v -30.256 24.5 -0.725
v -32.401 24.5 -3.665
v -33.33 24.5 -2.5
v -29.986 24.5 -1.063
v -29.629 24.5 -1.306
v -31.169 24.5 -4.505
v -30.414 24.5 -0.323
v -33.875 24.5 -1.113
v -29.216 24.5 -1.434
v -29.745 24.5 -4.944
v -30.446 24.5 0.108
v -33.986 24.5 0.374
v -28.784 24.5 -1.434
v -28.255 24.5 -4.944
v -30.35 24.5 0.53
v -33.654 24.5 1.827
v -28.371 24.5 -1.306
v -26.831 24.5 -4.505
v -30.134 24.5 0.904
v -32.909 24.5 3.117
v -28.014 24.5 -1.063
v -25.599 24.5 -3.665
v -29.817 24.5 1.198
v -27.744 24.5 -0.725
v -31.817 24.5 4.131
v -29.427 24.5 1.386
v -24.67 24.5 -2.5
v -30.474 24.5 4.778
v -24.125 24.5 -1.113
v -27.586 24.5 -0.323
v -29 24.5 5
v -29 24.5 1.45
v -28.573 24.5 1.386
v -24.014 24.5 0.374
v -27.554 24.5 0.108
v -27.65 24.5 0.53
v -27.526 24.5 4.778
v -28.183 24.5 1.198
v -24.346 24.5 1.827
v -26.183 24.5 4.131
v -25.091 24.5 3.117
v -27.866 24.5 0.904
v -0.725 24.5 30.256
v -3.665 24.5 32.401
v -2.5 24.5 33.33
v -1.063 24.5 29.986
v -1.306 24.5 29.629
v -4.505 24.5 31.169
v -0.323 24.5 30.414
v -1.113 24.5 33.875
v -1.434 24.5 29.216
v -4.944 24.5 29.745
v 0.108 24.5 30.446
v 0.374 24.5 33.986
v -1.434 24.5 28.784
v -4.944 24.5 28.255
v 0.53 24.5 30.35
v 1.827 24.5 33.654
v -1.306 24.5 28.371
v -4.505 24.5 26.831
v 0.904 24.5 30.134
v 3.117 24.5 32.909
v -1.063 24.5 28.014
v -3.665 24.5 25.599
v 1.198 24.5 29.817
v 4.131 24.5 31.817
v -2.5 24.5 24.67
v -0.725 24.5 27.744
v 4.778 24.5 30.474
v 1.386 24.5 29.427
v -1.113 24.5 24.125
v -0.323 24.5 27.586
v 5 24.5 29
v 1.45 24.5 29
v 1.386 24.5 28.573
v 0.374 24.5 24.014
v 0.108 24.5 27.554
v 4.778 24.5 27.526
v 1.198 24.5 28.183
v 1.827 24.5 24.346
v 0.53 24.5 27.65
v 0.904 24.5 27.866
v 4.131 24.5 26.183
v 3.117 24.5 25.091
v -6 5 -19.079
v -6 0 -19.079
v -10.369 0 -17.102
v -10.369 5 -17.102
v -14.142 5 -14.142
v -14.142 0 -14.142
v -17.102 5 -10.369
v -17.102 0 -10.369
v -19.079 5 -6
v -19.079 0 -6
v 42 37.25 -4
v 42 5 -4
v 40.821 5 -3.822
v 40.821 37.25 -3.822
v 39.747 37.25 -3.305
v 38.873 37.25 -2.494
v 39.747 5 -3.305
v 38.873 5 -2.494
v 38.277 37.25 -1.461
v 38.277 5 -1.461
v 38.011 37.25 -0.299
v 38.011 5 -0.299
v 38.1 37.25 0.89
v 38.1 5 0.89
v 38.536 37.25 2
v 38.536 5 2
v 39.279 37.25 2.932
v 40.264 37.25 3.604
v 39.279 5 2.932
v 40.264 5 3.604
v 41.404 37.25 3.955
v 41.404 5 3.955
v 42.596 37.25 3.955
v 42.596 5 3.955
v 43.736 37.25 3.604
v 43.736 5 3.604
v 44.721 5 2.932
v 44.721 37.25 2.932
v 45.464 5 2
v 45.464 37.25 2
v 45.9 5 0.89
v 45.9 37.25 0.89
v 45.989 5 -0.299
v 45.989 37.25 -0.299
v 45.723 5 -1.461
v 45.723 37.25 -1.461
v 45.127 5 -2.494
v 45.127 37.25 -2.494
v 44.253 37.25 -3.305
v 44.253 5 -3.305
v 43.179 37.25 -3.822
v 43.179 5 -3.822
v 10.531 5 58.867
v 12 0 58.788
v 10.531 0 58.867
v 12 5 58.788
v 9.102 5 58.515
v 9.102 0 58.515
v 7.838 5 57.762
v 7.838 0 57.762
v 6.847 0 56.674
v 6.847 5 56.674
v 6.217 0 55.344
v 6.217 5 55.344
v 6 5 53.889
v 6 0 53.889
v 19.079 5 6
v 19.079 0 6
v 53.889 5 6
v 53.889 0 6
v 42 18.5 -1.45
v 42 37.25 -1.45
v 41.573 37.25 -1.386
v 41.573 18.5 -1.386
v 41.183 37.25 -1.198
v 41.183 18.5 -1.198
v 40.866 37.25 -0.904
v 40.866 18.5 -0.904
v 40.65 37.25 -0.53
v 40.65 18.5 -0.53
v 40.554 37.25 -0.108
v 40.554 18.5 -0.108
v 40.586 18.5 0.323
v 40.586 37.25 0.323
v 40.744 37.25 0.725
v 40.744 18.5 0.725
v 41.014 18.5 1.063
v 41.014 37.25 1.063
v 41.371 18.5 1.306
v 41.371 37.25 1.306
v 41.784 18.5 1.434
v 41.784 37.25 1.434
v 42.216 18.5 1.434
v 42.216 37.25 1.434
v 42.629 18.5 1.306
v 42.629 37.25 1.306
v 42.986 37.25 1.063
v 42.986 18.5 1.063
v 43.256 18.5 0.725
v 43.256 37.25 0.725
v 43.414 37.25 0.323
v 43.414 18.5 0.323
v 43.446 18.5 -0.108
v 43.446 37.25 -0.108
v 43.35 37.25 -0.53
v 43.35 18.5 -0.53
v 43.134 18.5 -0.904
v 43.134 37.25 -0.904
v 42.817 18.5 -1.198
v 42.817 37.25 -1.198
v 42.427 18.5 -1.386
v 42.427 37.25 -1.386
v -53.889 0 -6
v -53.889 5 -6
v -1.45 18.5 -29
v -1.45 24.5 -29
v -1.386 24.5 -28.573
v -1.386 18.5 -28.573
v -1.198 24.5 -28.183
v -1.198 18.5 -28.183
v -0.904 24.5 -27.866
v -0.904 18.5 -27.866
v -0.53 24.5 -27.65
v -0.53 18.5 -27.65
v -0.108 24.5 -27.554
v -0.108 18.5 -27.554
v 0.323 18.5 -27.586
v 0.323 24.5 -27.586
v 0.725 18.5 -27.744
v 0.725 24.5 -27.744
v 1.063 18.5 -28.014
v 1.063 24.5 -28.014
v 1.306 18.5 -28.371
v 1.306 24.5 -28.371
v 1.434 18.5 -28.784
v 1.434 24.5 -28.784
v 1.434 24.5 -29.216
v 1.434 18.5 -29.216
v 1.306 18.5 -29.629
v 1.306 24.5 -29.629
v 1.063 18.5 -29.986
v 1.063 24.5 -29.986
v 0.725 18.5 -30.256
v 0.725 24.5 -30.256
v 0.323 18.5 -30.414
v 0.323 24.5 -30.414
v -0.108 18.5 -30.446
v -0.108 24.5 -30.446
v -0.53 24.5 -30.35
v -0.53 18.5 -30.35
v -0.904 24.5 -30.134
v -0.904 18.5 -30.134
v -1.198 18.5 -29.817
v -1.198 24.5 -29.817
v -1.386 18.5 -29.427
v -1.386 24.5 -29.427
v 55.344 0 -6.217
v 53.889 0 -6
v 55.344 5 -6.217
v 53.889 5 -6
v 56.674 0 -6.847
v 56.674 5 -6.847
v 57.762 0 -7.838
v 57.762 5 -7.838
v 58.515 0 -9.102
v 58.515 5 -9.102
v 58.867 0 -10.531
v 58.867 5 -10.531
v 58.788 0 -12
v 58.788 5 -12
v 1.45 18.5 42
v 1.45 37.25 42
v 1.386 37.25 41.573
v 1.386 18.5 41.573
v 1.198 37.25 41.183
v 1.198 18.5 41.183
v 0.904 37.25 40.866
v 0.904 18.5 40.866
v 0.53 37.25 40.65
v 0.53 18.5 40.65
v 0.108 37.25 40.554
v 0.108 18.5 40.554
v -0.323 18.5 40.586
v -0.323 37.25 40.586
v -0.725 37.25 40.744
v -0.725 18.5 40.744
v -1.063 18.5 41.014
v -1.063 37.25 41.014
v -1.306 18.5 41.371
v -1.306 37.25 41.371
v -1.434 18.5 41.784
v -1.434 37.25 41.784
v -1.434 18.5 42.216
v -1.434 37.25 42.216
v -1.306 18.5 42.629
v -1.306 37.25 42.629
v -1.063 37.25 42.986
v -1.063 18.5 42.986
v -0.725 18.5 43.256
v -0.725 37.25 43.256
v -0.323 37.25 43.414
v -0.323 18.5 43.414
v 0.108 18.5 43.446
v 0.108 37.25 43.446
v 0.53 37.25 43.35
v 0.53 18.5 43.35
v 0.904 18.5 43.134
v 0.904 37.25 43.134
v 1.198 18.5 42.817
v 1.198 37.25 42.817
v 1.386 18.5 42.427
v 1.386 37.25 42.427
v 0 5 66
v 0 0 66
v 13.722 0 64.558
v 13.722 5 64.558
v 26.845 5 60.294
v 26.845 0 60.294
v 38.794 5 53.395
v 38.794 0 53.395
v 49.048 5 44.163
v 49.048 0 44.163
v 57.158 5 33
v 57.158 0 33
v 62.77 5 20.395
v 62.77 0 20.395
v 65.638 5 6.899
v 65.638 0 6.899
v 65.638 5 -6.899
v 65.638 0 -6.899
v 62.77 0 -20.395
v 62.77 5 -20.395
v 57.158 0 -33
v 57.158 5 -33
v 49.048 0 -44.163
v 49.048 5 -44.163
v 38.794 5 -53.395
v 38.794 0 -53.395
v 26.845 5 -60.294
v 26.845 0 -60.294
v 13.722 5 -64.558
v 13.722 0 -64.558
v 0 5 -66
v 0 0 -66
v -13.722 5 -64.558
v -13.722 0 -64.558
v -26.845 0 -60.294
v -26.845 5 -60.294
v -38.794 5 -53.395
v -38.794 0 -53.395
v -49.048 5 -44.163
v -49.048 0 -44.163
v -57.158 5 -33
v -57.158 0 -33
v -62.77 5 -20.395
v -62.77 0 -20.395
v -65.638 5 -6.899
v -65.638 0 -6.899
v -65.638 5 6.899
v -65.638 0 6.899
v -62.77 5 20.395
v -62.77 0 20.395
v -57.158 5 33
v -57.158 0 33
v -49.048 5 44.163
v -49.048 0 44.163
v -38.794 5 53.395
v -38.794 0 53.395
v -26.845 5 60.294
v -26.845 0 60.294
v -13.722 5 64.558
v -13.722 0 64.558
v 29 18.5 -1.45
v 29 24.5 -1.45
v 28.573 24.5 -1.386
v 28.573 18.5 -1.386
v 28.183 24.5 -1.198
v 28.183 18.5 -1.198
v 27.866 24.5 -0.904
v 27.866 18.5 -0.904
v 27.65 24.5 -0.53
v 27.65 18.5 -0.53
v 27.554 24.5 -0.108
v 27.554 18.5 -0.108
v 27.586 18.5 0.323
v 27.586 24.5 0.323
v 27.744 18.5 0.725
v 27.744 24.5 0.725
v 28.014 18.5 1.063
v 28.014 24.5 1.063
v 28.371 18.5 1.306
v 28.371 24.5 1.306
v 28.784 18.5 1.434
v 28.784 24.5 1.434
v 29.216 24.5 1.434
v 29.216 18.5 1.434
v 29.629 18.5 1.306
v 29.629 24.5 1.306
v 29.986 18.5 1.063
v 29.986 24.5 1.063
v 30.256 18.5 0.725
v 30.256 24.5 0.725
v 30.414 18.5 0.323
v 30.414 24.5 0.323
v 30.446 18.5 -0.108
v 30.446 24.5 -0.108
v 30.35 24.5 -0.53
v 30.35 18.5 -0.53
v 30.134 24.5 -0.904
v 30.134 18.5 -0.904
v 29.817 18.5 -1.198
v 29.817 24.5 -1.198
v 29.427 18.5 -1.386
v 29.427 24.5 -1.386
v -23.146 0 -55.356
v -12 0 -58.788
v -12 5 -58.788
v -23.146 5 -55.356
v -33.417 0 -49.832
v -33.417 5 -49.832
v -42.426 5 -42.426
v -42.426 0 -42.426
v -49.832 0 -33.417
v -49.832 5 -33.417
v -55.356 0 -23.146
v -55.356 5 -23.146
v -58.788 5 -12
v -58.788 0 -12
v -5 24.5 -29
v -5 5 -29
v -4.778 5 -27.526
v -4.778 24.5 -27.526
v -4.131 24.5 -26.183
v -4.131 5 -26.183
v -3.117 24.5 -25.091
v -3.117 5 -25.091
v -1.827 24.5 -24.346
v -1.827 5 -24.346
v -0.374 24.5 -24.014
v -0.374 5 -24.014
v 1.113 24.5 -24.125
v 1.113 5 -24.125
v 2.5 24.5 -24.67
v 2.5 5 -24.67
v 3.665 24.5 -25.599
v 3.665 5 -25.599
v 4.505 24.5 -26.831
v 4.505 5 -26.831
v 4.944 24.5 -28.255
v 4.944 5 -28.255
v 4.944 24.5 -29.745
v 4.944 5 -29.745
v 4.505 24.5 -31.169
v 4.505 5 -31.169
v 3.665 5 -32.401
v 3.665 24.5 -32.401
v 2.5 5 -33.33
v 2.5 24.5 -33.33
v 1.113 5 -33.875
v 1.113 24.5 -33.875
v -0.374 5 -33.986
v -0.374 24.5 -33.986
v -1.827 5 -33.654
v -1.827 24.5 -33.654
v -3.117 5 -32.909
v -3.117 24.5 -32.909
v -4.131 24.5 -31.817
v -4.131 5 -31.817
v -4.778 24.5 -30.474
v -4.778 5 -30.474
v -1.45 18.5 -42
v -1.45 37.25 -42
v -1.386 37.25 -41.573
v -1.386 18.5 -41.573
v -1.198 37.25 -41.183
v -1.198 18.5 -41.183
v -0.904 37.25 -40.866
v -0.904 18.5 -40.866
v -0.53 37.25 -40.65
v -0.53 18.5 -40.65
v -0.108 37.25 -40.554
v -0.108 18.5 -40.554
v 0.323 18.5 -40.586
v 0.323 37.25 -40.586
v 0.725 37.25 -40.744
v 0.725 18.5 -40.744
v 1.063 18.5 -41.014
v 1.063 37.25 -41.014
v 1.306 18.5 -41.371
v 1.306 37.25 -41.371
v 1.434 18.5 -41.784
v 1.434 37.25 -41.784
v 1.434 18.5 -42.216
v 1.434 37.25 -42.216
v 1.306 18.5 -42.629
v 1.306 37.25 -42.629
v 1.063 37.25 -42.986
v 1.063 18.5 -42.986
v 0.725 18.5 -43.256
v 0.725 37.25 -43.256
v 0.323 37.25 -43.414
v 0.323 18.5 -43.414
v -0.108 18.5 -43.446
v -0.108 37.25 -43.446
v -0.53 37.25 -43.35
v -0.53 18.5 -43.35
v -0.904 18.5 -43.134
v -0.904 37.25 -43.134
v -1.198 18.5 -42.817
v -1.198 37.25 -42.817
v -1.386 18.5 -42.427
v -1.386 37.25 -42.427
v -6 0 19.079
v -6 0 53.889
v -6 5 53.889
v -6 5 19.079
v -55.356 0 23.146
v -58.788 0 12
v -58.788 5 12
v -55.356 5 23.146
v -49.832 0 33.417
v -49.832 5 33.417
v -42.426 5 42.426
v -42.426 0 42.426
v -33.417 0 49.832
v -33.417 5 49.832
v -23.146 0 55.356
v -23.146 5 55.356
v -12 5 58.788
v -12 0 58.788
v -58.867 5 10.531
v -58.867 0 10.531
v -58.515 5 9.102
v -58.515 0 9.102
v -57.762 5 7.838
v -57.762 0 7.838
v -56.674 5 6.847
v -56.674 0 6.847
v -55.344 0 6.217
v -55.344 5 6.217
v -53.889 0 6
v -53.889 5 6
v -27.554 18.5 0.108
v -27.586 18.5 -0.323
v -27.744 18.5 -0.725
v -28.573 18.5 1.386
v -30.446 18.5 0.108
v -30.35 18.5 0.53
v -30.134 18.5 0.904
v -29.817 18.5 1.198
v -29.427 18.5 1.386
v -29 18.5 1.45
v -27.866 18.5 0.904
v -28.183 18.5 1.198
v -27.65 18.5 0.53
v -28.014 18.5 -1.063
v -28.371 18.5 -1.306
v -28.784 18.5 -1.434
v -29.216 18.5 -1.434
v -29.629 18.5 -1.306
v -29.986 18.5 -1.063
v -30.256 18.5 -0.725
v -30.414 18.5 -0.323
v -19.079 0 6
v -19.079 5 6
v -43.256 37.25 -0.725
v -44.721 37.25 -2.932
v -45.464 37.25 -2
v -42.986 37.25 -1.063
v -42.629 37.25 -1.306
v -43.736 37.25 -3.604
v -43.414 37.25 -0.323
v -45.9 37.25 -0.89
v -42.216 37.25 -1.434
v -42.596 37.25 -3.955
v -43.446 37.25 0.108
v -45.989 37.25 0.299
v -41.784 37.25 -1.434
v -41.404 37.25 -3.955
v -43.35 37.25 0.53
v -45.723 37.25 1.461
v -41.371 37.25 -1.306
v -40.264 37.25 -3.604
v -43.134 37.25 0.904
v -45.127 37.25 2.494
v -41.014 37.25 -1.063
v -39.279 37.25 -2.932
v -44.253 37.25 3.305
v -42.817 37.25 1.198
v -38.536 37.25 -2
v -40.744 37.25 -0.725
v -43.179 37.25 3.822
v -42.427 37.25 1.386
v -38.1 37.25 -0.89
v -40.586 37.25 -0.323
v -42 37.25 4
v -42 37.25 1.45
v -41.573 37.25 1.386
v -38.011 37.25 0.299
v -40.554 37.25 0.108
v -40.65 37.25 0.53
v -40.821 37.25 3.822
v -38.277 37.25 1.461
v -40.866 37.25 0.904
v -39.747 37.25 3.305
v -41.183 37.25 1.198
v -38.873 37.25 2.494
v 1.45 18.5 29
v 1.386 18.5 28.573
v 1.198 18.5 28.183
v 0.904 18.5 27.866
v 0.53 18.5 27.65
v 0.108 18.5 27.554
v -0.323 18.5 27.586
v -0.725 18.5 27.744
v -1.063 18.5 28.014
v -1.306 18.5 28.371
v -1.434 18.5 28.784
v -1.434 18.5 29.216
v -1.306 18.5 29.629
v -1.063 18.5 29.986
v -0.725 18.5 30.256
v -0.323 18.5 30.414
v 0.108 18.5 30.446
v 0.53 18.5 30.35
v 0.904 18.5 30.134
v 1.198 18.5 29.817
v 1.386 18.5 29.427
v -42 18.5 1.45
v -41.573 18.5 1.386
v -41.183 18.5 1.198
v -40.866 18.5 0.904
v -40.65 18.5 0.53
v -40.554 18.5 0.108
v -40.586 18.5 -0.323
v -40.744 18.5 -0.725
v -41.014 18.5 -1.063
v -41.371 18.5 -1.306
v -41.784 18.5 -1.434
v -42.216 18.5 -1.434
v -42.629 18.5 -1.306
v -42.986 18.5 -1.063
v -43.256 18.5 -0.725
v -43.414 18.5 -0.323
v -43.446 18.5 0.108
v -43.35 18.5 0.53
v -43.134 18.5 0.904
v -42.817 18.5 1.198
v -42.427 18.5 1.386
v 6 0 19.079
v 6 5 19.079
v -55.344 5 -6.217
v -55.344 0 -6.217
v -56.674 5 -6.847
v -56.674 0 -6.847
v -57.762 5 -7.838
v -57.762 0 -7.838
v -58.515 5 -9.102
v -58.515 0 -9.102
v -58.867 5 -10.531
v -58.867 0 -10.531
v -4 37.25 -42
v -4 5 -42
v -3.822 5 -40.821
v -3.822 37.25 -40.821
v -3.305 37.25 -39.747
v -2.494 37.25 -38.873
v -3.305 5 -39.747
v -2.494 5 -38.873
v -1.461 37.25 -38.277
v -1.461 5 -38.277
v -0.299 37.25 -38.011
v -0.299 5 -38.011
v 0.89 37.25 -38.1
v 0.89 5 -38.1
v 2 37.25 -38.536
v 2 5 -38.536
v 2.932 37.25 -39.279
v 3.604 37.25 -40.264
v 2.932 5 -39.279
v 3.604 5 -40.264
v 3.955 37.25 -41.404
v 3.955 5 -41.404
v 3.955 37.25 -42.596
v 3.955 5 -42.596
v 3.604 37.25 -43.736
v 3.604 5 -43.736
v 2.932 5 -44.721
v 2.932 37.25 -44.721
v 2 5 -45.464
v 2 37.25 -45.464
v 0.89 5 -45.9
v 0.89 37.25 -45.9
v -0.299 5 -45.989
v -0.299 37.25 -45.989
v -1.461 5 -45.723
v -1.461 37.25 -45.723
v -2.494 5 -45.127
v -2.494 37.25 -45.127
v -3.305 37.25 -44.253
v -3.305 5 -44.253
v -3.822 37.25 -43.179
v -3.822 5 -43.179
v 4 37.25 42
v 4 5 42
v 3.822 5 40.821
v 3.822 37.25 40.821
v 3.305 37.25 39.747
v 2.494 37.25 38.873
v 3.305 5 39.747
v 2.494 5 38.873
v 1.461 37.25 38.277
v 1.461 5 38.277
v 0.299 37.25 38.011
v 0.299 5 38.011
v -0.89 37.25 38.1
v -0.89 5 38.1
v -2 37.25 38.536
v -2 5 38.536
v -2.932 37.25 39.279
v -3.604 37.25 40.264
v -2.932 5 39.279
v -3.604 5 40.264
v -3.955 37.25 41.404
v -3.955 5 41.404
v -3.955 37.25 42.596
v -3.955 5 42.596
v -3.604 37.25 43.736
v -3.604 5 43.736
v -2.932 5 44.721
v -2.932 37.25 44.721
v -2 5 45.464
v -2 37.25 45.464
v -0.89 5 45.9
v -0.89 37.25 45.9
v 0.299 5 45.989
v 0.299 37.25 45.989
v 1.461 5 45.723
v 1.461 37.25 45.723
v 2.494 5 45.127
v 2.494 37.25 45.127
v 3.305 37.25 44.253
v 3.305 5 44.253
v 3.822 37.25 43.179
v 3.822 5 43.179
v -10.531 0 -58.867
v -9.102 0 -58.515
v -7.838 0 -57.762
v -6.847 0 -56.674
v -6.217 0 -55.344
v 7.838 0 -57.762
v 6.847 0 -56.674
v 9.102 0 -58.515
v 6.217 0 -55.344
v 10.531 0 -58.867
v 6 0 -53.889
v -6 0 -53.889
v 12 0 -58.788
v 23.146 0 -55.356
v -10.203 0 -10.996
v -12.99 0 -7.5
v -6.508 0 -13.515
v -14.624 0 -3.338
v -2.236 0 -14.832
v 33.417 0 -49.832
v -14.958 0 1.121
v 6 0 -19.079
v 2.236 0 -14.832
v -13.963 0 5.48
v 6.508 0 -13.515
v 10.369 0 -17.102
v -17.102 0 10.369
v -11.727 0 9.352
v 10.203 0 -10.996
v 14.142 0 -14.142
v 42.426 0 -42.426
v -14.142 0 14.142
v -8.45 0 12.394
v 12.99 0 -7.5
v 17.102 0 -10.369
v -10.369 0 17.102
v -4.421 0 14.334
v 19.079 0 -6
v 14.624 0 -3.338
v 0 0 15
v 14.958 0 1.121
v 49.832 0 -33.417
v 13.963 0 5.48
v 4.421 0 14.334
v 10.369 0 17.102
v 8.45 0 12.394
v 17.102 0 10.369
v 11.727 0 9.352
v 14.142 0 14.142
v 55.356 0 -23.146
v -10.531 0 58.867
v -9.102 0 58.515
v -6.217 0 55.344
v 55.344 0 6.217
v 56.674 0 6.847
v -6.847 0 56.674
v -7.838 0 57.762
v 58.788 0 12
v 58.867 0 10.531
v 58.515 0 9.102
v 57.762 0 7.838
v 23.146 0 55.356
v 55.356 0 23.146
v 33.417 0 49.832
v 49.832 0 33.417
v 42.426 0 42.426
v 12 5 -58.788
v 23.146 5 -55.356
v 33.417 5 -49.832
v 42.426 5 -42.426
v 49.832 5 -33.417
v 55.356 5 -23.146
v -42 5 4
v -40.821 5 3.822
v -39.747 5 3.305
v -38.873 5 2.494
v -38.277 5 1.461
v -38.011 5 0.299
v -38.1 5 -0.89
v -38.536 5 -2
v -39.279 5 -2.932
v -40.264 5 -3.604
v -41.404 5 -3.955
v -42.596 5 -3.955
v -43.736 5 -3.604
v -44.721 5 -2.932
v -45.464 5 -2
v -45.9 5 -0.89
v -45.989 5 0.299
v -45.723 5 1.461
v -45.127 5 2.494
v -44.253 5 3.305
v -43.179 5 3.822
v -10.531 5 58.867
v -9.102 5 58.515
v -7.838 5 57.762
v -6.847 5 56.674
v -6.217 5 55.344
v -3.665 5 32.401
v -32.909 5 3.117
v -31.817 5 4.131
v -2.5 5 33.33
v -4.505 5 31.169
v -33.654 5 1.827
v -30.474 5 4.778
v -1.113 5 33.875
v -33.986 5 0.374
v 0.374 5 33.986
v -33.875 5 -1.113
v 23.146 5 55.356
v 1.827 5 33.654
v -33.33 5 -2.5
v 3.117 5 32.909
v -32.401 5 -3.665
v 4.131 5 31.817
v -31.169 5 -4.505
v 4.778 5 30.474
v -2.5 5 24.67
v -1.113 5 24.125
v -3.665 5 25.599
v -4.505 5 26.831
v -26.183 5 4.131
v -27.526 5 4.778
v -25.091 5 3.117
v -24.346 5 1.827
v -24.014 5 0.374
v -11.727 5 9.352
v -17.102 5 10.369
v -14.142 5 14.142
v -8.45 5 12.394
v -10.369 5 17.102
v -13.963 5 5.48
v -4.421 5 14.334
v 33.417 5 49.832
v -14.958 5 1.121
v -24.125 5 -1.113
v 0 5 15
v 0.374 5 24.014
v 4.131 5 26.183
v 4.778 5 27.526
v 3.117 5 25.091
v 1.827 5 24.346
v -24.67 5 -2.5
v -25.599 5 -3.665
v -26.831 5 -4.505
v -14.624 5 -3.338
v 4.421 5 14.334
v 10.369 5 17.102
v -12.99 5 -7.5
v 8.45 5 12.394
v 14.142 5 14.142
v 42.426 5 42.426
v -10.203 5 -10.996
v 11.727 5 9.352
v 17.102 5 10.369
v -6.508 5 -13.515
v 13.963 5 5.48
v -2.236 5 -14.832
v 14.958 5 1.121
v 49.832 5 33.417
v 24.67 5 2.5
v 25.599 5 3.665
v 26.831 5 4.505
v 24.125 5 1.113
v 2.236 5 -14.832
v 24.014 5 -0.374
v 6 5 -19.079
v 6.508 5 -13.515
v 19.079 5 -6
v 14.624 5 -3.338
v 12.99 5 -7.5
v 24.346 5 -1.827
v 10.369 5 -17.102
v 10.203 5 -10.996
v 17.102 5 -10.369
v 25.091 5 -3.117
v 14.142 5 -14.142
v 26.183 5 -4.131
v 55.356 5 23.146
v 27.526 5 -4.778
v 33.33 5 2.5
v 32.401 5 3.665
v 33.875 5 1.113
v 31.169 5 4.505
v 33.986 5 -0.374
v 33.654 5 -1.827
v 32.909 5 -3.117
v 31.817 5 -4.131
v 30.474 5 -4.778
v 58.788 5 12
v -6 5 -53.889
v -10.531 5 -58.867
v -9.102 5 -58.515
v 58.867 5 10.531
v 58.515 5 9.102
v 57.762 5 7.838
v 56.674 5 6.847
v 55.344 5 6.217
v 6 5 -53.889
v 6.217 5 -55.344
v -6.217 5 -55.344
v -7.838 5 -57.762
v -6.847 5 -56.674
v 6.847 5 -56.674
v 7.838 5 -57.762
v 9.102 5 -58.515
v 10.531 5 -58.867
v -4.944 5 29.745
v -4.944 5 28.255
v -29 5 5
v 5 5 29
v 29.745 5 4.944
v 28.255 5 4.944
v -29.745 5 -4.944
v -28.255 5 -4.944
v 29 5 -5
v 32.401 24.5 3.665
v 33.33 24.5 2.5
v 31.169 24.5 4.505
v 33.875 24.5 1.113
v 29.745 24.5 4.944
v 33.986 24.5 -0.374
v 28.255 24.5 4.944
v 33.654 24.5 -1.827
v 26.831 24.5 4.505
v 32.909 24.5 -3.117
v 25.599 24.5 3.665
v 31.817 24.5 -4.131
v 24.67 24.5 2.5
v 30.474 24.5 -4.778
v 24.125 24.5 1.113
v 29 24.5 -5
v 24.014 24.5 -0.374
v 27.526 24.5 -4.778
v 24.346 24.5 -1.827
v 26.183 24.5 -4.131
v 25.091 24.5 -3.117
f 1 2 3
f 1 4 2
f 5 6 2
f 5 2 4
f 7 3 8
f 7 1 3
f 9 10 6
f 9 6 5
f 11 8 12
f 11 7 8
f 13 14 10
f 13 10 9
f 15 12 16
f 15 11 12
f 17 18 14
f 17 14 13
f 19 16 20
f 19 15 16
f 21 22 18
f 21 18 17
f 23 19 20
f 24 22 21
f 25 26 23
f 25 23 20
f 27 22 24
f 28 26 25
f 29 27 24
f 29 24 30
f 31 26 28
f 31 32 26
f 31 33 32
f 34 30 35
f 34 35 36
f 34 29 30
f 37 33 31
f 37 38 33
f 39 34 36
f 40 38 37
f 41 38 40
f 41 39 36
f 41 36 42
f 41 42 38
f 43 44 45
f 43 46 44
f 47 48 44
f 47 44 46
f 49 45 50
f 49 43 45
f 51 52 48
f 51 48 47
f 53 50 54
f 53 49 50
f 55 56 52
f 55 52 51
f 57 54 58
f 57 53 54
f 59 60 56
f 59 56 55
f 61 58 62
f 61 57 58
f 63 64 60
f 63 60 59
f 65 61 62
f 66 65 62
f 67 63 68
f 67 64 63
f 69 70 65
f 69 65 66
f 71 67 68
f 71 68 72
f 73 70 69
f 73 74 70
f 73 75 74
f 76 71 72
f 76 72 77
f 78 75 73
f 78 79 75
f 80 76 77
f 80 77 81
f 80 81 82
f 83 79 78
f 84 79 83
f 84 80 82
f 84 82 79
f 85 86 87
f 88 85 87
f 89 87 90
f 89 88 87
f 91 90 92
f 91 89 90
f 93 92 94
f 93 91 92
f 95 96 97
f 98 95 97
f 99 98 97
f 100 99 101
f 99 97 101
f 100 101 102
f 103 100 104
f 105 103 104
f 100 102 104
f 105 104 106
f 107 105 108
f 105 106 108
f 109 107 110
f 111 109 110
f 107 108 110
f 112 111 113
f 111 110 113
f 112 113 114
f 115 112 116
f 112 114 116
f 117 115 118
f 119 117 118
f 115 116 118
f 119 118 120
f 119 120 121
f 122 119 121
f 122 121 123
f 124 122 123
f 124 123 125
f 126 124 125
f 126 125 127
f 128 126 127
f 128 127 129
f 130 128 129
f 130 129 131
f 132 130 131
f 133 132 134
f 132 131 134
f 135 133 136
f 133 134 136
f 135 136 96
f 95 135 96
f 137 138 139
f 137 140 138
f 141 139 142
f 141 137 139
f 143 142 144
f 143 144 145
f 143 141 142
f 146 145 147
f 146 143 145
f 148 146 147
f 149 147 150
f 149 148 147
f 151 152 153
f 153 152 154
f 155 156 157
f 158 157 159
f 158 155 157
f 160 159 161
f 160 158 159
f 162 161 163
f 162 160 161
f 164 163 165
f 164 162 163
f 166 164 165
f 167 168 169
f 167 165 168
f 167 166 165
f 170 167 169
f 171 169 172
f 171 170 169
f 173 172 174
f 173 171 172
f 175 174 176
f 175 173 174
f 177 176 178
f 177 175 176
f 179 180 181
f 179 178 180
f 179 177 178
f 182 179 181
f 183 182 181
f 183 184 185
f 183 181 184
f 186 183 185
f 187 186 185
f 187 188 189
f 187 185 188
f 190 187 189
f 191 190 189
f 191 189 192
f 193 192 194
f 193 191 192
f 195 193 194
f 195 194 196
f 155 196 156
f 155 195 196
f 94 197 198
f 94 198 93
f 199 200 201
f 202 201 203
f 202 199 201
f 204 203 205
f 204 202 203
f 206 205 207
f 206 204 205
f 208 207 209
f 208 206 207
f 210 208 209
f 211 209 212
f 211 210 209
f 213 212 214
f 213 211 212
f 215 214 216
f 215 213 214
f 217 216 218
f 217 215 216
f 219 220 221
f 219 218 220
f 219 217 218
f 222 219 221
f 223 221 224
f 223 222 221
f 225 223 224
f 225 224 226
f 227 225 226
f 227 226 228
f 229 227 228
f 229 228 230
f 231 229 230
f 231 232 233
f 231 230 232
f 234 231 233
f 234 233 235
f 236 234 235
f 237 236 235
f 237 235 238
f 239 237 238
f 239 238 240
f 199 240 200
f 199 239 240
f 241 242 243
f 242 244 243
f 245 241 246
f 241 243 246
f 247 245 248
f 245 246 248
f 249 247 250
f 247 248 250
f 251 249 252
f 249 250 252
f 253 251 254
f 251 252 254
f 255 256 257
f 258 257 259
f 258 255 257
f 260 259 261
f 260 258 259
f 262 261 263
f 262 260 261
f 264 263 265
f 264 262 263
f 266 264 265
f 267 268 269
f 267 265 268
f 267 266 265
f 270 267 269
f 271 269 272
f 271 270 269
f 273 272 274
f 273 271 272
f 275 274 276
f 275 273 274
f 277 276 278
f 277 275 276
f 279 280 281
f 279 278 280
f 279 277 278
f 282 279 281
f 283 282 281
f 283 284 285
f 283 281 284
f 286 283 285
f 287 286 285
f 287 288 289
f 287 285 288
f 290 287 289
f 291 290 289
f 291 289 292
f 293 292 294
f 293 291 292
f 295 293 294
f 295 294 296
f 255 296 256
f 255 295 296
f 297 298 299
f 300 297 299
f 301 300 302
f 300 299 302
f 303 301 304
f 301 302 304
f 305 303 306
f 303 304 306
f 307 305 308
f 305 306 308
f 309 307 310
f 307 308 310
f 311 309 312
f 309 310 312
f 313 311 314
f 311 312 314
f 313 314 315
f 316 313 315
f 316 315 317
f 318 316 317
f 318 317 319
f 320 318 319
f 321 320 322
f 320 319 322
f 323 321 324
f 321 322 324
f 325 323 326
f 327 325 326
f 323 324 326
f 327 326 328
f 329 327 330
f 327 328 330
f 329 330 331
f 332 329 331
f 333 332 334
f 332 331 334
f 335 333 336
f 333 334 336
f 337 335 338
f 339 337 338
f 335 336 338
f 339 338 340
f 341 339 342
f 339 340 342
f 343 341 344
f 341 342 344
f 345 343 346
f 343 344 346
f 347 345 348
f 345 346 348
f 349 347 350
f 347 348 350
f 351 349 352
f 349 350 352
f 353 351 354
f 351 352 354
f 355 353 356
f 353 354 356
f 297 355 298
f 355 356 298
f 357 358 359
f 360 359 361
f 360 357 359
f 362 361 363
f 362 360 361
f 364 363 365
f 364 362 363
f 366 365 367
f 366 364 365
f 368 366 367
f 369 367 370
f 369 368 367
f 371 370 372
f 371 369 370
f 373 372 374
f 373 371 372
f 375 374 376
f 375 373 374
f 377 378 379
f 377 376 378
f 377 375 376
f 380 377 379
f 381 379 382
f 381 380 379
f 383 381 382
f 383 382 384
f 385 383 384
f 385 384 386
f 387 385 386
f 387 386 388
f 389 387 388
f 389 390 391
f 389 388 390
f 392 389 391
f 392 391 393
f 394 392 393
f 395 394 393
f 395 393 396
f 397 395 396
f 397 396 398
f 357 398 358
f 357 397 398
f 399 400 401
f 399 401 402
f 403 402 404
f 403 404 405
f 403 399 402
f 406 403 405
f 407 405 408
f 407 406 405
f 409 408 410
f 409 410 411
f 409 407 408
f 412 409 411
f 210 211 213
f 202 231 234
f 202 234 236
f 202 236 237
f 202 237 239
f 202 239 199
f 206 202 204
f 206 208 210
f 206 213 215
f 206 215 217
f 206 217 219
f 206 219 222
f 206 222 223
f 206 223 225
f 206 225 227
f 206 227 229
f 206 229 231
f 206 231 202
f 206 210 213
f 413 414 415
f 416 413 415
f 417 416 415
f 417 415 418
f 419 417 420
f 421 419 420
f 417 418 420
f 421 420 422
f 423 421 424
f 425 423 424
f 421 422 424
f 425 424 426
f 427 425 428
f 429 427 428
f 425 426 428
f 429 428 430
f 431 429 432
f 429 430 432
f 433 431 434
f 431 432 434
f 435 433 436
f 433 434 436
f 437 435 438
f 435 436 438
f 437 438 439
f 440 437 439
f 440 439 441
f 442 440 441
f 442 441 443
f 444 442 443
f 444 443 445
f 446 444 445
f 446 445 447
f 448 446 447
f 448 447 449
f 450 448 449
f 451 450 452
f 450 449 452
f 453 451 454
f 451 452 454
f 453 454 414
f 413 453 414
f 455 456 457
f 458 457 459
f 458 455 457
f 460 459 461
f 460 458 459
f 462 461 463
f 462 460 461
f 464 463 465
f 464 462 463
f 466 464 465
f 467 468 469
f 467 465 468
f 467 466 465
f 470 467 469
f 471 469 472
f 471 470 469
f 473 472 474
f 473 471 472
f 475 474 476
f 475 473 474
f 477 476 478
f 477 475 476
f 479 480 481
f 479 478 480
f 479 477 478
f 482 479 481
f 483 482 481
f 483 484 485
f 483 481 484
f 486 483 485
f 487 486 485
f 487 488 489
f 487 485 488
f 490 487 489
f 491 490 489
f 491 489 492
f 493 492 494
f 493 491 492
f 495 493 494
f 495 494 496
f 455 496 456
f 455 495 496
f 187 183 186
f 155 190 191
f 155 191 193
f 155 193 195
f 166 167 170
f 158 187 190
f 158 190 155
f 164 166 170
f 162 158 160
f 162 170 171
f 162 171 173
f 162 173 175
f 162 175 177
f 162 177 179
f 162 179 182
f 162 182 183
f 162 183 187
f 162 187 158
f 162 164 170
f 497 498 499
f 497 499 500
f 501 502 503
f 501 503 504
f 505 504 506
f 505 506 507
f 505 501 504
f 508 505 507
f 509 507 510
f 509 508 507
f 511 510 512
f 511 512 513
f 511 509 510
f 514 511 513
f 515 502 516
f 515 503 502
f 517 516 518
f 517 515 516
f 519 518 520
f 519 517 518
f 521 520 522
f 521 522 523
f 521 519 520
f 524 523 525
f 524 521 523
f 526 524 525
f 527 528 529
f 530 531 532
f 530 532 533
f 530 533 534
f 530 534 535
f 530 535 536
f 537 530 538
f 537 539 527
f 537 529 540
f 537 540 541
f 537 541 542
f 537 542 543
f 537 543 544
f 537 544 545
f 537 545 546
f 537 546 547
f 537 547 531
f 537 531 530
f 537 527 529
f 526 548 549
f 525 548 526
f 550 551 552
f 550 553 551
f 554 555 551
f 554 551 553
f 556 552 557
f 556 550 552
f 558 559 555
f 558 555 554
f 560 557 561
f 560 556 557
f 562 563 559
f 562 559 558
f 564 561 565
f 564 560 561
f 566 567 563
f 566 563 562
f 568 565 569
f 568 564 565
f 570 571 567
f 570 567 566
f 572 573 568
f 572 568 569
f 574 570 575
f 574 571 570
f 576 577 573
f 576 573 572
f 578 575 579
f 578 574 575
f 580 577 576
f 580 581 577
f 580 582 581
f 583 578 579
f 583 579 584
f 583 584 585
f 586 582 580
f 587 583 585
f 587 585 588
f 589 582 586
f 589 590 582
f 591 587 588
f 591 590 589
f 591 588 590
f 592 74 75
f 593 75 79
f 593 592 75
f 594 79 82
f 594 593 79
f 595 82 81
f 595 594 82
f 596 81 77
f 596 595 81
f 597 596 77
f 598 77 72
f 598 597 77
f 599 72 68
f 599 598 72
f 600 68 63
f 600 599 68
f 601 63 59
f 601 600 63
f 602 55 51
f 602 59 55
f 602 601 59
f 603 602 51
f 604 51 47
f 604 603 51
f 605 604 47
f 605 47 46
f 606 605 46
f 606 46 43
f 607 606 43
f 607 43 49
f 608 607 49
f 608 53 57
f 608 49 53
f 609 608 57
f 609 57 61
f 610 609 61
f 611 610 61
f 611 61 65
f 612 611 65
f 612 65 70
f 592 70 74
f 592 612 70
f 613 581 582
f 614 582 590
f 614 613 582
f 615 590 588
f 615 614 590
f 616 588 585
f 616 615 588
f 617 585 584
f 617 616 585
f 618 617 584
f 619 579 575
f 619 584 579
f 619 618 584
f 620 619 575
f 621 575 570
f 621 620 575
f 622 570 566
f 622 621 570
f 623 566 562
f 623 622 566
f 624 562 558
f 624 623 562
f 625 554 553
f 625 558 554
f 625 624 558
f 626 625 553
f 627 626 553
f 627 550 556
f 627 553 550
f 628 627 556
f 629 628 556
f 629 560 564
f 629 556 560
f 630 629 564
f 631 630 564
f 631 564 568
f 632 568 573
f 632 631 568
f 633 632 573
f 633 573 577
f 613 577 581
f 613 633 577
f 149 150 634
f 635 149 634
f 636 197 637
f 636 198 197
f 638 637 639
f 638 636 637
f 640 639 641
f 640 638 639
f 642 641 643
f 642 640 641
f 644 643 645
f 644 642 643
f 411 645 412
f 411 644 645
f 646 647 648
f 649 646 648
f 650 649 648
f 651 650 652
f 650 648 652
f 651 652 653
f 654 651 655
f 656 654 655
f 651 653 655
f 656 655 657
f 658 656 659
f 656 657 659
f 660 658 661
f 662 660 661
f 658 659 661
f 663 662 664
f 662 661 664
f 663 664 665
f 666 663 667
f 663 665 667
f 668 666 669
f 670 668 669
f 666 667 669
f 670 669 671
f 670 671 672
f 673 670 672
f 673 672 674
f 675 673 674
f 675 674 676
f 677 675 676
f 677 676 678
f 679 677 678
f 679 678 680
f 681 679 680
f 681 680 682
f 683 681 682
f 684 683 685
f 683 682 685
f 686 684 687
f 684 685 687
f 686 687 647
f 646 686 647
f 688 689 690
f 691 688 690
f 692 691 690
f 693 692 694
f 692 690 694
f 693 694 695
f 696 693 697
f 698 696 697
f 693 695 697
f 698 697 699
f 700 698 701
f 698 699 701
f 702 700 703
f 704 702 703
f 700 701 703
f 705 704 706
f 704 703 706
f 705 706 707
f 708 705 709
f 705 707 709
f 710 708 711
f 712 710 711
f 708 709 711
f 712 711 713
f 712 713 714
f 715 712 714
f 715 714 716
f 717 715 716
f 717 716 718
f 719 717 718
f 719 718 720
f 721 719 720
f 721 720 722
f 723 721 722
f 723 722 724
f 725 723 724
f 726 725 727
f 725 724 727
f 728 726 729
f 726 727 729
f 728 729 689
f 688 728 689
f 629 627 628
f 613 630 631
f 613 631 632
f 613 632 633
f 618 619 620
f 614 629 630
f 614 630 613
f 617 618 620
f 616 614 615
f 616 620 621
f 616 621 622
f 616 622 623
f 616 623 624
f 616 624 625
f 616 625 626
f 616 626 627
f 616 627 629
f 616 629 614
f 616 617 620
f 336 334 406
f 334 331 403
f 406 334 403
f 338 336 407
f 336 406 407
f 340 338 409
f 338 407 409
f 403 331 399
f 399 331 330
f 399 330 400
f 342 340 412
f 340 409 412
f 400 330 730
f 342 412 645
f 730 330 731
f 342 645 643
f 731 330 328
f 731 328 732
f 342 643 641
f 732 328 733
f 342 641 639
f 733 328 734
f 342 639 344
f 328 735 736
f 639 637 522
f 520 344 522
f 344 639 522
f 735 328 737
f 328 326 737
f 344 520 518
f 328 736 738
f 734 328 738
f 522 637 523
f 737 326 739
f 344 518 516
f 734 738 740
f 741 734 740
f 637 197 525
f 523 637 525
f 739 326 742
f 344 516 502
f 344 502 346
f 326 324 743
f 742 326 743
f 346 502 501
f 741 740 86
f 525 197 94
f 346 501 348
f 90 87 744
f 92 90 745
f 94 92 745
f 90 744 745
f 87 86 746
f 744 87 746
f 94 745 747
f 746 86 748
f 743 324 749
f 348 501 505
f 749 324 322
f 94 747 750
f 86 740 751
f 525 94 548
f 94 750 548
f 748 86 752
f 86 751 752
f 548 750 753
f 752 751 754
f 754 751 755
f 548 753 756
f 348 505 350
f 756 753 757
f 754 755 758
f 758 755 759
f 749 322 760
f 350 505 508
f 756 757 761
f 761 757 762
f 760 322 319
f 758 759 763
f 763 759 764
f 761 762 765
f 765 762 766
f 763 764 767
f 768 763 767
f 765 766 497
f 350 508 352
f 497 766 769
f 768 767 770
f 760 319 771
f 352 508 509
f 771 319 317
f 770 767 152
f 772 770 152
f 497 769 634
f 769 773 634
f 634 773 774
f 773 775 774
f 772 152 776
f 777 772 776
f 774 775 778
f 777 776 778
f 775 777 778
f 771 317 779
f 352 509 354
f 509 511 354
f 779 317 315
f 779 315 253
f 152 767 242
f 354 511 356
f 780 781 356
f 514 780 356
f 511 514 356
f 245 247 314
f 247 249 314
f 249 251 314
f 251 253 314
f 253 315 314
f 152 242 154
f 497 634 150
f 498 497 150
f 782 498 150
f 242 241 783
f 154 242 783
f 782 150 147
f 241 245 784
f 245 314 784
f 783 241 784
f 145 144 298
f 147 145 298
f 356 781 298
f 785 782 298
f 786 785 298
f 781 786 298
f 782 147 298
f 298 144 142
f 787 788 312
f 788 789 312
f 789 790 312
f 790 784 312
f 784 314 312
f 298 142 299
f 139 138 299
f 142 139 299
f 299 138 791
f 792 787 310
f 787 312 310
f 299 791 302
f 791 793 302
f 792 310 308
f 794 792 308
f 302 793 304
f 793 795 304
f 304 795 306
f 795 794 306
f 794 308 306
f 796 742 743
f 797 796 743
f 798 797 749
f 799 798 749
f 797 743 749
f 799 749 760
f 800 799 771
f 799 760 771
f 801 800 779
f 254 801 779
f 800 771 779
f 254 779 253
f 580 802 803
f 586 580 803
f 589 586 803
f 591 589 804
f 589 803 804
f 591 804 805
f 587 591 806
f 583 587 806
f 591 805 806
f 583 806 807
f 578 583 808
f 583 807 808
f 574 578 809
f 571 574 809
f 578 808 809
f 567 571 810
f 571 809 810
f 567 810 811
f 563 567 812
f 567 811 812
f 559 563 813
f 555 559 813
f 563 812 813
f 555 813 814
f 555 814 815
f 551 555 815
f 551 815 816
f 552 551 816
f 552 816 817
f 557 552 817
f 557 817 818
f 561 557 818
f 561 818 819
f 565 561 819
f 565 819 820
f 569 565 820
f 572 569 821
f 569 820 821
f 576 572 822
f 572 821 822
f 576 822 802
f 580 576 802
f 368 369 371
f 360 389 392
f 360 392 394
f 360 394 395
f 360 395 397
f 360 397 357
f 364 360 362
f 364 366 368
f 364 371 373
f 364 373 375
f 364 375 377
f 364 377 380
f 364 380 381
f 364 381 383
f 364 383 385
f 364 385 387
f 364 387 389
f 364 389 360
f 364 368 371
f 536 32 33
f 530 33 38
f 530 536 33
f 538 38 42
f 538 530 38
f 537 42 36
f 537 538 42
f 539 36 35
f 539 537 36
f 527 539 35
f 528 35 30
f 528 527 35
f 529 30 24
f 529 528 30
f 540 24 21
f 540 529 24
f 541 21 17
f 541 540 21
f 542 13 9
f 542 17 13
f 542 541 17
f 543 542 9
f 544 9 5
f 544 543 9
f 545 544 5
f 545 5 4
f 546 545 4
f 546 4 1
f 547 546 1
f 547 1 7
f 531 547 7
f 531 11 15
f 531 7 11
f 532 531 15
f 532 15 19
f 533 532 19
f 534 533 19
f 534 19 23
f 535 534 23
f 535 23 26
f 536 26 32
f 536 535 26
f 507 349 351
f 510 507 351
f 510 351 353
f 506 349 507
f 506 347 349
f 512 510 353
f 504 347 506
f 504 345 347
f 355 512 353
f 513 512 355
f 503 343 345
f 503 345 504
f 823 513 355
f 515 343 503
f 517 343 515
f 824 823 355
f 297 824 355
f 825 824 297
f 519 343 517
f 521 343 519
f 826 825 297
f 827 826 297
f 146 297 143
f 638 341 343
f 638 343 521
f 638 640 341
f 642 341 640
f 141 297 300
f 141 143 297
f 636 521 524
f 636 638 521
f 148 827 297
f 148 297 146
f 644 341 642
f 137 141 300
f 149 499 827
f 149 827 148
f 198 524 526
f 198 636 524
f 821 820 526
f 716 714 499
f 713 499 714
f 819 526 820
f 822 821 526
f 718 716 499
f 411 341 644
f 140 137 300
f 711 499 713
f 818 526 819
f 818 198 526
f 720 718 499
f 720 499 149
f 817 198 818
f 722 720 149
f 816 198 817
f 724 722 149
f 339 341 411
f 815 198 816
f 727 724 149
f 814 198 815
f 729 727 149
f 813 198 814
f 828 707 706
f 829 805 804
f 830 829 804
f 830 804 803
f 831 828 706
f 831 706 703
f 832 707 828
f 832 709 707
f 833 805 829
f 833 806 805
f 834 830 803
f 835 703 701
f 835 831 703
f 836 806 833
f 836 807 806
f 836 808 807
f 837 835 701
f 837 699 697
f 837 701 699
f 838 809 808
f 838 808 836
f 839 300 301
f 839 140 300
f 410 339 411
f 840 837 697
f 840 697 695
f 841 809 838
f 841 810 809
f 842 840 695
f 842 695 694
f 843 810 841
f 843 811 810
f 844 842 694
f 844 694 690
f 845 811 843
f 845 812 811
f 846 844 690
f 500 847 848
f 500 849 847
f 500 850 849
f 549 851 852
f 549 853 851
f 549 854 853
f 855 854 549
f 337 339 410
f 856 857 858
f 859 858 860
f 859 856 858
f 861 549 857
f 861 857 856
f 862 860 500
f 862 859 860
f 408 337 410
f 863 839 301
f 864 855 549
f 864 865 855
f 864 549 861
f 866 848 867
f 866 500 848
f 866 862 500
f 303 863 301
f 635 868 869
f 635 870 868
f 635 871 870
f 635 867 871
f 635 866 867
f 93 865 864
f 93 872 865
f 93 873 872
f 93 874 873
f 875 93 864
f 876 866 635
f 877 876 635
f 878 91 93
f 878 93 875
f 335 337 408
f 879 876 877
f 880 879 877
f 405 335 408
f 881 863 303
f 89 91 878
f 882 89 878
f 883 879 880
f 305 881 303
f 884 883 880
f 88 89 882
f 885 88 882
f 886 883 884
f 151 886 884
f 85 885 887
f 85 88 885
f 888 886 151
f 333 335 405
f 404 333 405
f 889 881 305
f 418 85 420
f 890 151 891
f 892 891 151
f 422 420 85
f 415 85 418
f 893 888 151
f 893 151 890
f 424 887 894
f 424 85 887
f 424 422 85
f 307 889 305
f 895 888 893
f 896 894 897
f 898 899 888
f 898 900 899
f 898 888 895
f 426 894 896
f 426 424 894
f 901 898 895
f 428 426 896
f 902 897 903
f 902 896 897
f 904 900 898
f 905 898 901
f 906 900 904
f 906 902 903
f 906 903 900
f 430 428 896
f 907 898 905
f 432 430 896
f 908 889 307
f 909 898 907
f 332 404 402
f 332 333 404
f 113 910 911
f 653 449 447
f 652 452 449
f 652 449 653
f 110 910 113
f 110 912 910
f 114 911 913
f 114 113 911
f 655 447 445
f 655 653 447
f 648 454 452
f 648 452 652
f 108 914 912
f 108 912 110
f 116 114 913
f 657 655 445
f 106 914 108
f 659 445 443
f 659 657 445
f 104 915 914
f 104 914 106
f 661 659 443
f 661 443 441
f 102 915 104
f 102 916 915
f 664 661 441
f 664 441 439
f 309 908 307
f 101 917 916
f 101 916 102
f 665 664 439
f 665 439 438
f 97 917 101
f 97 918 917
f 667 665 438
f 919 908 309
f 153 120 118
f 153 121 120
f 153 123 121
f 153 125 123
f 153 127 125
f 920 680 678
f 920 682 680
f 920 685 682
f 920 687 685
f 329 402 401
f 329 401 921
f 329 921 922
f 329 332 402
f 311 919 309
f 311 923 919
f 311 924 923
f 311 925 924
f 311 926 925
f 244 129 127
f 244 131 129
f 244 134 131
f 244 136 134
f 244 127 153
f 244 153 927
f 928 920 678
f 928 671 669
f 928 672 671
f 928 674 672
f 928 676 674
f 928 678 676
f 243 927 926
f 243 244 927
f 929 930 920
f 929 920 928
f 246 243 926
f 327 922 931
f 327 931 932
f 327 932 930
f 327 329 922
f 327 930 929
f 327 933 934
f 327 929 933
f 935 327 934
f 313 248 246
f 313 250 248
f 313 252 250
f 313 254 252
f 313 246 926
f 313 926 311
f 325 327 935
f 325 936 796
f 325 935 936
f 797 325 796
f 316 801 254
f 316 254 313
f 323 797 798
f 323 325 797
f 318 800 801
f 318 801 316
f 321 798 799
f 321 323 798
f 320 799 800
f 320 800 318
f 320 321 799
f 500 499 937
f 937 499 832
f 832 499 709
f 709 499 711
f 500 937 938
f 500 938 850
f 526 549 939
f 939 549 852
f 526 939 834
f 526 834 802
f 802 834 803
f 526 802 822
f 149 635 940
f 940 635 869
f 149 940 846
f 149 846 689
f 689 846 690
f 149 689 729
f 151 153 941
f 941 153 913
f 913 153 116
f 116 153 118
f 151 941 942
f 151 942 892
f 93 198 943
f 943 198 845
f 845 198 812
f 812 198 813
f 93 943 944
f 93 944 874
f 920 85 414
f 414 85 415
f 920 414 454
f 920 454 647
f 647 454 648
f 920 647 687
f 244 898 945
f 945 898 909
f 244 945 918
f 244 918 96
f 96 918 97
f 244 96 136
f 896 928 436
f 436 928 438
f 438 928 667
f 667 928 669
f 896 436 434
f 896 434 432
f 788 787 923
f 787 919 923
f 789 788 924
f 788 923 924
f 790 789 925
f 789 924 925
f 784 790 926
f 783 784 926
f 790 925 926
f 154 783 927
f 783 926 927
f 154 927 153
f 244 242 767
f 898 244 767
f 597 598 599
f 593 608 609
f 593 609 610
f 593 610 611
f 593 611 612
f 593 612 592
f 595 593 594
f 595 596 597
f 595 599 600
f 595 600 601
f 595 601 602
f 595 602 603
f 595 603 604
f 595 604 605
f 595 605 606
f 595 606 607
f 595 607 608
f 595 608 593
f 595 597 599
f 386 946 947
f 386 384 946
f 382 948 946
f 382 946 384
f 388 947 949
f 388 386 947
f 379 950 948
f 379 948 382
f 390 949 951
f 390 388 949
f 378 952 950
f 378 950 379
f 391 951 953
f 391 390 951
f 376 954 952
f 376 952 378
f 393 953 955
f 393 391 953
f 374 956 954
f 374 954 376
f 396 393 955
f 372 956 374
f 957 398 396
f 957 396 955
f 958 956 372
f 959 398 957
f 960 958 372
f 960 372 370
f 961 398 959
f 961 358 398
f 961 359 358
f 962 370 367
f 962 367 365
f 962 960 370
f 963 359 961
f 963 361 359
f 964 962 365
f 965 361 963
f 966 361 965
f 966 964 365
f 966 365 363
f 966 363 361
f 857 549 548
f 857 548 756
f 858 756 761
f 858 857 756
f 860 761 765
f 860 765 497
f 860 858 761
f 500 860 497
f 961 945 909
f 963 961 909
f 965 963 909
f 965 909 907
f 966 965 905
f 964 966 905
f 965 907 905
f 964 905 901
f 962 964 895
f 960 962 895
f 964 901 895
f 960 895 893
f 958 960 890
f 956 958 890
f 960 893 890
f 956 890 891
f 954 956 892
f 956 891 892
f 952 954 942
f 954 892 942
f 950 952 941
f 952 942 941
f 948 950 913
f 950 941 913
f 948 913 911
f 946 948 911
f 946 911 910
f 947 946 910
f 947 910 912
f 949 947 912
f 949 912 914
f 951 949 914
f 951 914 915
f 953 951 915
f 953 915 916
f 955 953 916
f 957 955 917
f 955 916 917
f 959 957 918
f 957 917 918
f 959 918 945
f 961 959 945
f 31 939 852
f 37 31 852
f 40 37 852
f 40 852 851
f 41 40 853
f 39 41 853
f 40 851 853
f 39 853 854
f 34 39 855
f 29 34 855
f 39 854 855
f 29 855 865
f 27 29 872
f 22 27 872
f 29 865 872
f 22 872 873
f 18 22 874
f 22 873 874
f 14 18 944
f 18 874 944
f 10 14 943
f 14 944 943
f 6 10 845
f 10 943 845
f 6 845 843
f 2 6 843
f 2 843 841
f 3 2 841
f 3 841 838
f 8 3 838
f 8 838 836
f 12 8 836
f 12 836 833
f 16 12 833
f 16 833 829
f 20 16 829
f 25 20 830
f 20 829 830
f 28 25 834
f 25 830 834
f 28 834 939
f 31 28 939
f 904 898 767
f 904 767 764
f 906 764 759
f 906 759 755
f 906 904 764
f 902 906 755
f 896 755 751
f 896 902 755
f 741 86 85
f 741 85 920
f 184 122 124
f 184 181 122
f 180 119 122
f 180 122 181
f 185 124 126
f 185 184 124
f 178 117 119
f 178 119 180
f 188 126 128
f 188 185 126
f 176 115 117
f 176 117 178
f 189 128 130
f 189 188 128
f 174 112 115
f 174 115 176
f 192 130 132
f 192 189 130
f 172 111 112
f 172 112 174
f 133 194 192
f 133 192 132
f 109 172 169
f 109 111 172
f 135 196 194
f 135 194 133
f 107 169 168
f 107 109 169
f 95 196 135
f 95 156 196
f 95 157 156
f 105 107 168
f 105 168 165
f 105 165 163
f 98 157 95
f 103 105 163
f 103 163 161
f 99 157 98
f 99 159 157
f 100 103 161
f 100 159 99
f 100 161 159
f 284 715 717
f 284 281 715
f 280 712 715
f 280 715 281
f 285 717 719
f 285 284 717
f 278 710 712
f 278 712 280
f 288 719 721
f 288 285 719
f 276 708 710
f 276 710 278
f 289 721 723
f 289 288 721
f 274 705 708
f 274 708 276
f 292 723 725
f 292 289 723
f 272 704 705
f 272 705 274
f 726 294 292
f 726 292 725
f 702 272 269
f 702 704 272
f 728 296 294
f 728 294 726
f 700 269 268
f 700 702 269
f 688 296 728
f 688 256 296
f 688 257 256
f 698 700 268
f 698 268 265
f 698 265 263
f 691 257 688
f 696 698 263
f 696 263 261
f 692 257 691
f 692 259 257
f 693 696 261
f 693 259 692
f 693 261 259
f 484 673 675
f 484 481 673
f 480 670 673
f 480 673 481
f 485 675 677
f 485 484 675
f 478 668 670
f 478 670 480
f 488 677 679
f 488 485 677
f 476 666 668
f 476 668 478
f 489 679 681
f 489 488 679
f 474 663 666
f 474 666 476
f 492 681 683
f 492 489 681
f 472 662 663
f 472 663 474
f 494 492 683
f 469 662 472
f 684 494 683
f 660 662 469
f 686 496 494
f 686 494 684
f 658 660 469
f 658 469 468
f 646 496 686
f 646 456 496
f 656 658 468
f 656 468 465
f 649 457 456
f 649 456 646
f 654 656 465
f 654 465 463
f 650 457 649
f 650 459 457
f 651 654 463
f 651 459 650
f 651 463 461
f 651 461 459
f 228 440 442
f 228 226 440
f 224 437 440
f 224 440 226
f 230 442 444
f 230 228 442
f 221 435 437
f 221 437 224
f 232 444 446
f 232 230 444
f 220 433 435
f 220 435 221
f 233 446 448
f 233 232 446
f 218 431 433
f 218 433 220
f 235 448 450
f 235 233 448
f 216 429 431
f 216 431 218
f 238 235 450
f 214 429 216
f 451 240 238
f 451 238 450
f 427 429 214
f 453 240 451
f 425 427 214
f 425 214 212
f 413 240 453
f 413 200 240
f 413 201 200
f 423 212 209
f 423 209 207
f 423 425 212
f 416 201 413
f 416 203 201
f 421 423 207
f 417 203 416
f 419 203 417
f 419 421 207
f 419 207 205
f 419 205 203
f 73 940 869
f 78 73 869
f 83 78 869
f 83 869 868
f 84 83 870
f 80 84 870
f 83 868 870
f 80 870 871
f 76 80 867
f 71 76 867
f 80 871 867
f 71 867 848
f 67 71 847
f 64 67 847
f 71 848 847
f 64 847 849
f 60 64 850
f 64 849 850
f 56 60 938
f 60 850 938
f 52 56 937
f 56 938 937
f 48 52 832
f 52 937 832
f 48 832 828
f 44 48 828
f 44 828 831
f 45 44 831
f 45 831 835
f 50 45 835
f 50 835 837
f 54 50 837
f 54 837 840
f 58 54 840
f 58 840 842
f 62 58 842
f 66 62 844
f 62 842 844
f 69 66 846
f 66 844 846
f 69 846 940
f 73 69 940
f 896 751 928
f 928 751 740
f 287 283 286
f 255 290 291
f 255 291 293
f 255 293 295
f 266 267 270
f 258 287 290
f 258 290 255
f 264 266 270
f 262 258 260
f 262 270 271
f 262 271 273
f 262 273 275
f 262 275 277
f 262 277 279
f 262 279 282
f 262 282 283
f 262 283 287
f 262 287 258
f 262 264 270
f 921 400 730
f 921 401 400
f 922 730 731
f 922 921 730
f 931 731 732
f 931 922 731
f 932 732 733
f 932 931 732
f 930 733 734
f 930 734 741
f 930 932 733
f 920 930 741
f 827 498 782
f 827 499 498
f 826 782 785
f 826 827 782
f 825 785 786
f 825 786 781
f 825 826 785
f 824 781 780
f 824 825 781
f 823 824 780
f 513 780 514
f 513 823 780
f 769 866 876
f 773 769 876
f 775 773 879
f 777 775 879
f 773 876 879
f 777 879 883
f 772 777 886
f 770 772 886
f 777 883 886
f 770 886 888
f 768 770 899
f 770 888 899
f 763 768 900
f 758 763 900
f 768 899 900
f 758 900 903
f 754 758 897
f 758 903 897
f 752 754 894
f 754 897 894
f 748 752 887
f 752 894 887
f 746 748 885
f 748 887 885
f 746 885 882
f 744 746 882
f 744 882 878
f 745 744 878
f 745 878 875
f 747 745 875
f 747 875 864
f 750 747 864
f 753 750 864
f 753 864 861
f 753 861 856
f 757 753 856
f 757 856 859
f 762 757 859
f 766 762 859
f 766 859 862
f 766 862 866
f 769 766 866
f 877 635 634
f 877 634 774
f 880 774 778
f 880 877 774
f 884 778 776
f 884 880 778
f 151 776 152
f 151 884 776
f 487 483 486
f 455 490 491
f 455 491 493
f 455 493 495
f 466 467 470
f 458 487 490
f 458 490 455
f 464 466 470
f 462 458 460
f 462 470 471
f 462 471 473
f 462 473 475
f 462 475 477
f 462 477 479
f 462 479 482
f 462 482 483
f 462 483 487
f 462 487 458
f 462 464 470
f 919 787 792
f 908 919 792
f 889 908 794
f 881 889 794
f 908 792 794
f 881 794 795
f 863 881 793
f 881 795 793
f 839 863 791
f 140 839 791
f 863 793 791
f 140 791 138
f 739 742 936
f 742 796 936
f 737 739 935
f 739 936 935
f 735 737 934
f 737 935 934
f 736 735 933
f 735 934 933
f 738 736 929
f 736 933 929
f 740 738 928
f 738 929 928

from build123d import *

# Parameters (mm, degrees)
SKETCH1_R           = 66
BOSS_EXTRUDE1_DEPTH = 5
FILLET1_R           = 5
SKETCH3_R           = 5
BOSS_EXTRUDE3_DEPTH = 19.5
SKETCH4_R           = 20
BOSS_EXTRUDE4_DEPTH = 5
CIRPATTERN1_COUNT   = 4
SKETCH5_R           = 15
CUT_EXTRUDE1_DEPTH  = 10
SKETCH6_R           = 4
BOSS_EXTRUDE5_DEPTH = 32.25
CIRPATTERN2_COUNT   = 4
CUT_EXTRUDE3_START  = -6
SKETCH7_R           = 1.45
CUT_EXTRUDE3_DEPTH  = 103.5
CIRPATTERN3_COUNT   = 4


with BuildPart() as part:
    # Sketch1 → Boss-Extrude1 (new body)
    with BuildSketch(Plane(origin=(0, 0, 0), x_dir=(1, 0, 0), z_dir=(0, 1, 0))):
        with Locations(Location((0, 0, 0), (0, 0, 270))):
            Circle(SKETCH1_R)
        with BuildLine():
            Line((-6, -59.699246226), (-6, -6))
            Line((-6, -6), (-59.699246226, -6))
            ThreePointArc((-59.699246226, -6), (-42.426406871, -42.426406871), (-6, -59.699246226))
        make_face(mode=Mode.SUBTRACT)
        with BuildLine():
            Line((6, -59.699246226), (6, -6))
            Line((6, -6), (59.699246226, -6))
            ThreePointArc((59.699246226, -6), (42.426406871, -42.426406871), (6, -59.699246226))
        make_face(mode=Mode.SUBTRACT)
        with BuildLine():
            Line((-59.699246226, 6), (-6, 6))
            Line((-6, 6), (-6, 59.699246226))
            ThreePointArc((-6, 59.699246226), (-42.426406871, 42.426406871), (-59.699246226, 6))
        make_face(mode=Mode.SUBTRACT)
        with BuildLine():
            Line((6, 6), (6, 59.699246226))
            ThreePointArc((6, 59.699246226), (42.426406871, 42.426406871), (59.699246226, 6))
            Line((59.699246226, 6), (6, 6))
        make_face(mode=Mode.SUBTRACT)
    extrude(amount=BOSS_EXTRUDE1_DEPTH)

    # Fillet1
    fillet1_edges = [part.edges().sort_by_distance(p)[0] for p in [
        (-6, 2.5, -59.699246226),
        (-59.699246226, 2.5, -6),
        (-6, 2.5, -6),
        (6, 2.5, 59.699246226),
        (59.699246226, 2.5, 6),
        (6, 2.5, 6),
        (59.699246226, 2.5, -6),
        (6, 2.5, -59.699246226),
        (6, 2.5, -6),
        (-59.699246226, 2.5, 6),
        (-6, 2.5, 59.699246226),
        (-6, 2.5, 6),
    ]]
    fillet(fillet1_edges, radius=FILLET1_R)

    # Sketch3 → Boss-Extrude3 (add)
    with BuildSketch(Plane(origin=(0, 5, 0), x_dir=(1, 0, 0), z_dir=(0, 1, 0))):
        with Locations(Location((-29, 0, 0), (0, 0, 270))):
            Circle(SKETCH3_R)
    boss_extrude3 = extrude(amount=BOSS_EXTRUDE3_DEPTH)

    # Sketch4 → Boss-Extrude4 (add)
    with BuildSketch(Plane(origin=(0, 5, 0), x_dir=(1, 0, 0), z_dir=(0, 1, 0))):
        Circle(SKETCH4_R)
    extrude(amount=-BOSS_EXTRUDE4_DEPTH)

    # CirPattern1: Boss-Extrude3 ×4 about axis
    cirpattern1_axis = Axis((0, 0, 0), (0, 1, 0))
    for i in range(1, CIRPATTERN1_COUNT):
        add(boss_extrude3.rotate(cirpattern1_axis, i * 360 / CIRPATTERN1_COUNT))

    # Sketch5 → Cut-Extrude1 (cut)
    with BuildSketch(Plane(origin=(0, 5, 0), x_dir=(1, 0, 0), z_dir=(0, 1, 0))):
        with Locations(Location((0, 0, 0), (0, 0, 270))):
            Circle(SKETCH5_R)
    extrude(amount=-CUT_EXTRUDE1_DEPTH, mode=Mode.SUBTRACT)

    # Sketch6 → Boss-Extrude5 (add)
    with BuildSketch(Plane(origin=(0, 5, 0), x_dir=(1, 0, 0), z_dir=(0, 1, 0))):
        with Locations(Location((-42, 0, 0), (0, 0, 270))):
            Circle(SKETCH6_R)
    boss_extrude5 = extrude(amount=BOSS_EXTRUDE5_DEPTH)

    # CirPattern2: Boss-Extrude5 ×4 about axis
    cirpattern2_axis = Axis((0, 0, 0), (0, 1, 0))
    for i in range(1, CIRPATTERN2_COUNT):
        add(boss_extrude5.rotate(cirpattern2_axis, i * 360 / CIRPATTERN2_COUNT))

    # Sketch7 → Cut-Extrude3 (cut)
    with BuildSketch(Plane(origin=(0, 24.5, 0), x_dir=(1, 0, 0), z_dir=(0, 1, 0)).offset(CUT_EXTRUDE3_START)):
        with Locations(Location((-29, 0, 0), (0, 0, 270))):
            Circle(SKETCH7_R)
        with Locations(Location((-42, 0, 0), (0, 0, 270))):
            Circle(SKETCH7_R)
    cut_extrude3 = extrude(amount=CUT_EXTRUDE3_DEPTH, mode=Mode.SUBTRACT)

    # CirPattern3: Cut-Extrude3 ×4 about axis
    cirpattern3_axis = Axis((0, 0, 0), (0, 1, 0))
    for i in range(1, CIRPATTERN3_COUNT):
        add(cut_extrude3.rotate(cirpattern3_axis, i * 360 / CIRPATTERN3_COUNT), mode=Mode.SUBTRACT)


solid = part.part
